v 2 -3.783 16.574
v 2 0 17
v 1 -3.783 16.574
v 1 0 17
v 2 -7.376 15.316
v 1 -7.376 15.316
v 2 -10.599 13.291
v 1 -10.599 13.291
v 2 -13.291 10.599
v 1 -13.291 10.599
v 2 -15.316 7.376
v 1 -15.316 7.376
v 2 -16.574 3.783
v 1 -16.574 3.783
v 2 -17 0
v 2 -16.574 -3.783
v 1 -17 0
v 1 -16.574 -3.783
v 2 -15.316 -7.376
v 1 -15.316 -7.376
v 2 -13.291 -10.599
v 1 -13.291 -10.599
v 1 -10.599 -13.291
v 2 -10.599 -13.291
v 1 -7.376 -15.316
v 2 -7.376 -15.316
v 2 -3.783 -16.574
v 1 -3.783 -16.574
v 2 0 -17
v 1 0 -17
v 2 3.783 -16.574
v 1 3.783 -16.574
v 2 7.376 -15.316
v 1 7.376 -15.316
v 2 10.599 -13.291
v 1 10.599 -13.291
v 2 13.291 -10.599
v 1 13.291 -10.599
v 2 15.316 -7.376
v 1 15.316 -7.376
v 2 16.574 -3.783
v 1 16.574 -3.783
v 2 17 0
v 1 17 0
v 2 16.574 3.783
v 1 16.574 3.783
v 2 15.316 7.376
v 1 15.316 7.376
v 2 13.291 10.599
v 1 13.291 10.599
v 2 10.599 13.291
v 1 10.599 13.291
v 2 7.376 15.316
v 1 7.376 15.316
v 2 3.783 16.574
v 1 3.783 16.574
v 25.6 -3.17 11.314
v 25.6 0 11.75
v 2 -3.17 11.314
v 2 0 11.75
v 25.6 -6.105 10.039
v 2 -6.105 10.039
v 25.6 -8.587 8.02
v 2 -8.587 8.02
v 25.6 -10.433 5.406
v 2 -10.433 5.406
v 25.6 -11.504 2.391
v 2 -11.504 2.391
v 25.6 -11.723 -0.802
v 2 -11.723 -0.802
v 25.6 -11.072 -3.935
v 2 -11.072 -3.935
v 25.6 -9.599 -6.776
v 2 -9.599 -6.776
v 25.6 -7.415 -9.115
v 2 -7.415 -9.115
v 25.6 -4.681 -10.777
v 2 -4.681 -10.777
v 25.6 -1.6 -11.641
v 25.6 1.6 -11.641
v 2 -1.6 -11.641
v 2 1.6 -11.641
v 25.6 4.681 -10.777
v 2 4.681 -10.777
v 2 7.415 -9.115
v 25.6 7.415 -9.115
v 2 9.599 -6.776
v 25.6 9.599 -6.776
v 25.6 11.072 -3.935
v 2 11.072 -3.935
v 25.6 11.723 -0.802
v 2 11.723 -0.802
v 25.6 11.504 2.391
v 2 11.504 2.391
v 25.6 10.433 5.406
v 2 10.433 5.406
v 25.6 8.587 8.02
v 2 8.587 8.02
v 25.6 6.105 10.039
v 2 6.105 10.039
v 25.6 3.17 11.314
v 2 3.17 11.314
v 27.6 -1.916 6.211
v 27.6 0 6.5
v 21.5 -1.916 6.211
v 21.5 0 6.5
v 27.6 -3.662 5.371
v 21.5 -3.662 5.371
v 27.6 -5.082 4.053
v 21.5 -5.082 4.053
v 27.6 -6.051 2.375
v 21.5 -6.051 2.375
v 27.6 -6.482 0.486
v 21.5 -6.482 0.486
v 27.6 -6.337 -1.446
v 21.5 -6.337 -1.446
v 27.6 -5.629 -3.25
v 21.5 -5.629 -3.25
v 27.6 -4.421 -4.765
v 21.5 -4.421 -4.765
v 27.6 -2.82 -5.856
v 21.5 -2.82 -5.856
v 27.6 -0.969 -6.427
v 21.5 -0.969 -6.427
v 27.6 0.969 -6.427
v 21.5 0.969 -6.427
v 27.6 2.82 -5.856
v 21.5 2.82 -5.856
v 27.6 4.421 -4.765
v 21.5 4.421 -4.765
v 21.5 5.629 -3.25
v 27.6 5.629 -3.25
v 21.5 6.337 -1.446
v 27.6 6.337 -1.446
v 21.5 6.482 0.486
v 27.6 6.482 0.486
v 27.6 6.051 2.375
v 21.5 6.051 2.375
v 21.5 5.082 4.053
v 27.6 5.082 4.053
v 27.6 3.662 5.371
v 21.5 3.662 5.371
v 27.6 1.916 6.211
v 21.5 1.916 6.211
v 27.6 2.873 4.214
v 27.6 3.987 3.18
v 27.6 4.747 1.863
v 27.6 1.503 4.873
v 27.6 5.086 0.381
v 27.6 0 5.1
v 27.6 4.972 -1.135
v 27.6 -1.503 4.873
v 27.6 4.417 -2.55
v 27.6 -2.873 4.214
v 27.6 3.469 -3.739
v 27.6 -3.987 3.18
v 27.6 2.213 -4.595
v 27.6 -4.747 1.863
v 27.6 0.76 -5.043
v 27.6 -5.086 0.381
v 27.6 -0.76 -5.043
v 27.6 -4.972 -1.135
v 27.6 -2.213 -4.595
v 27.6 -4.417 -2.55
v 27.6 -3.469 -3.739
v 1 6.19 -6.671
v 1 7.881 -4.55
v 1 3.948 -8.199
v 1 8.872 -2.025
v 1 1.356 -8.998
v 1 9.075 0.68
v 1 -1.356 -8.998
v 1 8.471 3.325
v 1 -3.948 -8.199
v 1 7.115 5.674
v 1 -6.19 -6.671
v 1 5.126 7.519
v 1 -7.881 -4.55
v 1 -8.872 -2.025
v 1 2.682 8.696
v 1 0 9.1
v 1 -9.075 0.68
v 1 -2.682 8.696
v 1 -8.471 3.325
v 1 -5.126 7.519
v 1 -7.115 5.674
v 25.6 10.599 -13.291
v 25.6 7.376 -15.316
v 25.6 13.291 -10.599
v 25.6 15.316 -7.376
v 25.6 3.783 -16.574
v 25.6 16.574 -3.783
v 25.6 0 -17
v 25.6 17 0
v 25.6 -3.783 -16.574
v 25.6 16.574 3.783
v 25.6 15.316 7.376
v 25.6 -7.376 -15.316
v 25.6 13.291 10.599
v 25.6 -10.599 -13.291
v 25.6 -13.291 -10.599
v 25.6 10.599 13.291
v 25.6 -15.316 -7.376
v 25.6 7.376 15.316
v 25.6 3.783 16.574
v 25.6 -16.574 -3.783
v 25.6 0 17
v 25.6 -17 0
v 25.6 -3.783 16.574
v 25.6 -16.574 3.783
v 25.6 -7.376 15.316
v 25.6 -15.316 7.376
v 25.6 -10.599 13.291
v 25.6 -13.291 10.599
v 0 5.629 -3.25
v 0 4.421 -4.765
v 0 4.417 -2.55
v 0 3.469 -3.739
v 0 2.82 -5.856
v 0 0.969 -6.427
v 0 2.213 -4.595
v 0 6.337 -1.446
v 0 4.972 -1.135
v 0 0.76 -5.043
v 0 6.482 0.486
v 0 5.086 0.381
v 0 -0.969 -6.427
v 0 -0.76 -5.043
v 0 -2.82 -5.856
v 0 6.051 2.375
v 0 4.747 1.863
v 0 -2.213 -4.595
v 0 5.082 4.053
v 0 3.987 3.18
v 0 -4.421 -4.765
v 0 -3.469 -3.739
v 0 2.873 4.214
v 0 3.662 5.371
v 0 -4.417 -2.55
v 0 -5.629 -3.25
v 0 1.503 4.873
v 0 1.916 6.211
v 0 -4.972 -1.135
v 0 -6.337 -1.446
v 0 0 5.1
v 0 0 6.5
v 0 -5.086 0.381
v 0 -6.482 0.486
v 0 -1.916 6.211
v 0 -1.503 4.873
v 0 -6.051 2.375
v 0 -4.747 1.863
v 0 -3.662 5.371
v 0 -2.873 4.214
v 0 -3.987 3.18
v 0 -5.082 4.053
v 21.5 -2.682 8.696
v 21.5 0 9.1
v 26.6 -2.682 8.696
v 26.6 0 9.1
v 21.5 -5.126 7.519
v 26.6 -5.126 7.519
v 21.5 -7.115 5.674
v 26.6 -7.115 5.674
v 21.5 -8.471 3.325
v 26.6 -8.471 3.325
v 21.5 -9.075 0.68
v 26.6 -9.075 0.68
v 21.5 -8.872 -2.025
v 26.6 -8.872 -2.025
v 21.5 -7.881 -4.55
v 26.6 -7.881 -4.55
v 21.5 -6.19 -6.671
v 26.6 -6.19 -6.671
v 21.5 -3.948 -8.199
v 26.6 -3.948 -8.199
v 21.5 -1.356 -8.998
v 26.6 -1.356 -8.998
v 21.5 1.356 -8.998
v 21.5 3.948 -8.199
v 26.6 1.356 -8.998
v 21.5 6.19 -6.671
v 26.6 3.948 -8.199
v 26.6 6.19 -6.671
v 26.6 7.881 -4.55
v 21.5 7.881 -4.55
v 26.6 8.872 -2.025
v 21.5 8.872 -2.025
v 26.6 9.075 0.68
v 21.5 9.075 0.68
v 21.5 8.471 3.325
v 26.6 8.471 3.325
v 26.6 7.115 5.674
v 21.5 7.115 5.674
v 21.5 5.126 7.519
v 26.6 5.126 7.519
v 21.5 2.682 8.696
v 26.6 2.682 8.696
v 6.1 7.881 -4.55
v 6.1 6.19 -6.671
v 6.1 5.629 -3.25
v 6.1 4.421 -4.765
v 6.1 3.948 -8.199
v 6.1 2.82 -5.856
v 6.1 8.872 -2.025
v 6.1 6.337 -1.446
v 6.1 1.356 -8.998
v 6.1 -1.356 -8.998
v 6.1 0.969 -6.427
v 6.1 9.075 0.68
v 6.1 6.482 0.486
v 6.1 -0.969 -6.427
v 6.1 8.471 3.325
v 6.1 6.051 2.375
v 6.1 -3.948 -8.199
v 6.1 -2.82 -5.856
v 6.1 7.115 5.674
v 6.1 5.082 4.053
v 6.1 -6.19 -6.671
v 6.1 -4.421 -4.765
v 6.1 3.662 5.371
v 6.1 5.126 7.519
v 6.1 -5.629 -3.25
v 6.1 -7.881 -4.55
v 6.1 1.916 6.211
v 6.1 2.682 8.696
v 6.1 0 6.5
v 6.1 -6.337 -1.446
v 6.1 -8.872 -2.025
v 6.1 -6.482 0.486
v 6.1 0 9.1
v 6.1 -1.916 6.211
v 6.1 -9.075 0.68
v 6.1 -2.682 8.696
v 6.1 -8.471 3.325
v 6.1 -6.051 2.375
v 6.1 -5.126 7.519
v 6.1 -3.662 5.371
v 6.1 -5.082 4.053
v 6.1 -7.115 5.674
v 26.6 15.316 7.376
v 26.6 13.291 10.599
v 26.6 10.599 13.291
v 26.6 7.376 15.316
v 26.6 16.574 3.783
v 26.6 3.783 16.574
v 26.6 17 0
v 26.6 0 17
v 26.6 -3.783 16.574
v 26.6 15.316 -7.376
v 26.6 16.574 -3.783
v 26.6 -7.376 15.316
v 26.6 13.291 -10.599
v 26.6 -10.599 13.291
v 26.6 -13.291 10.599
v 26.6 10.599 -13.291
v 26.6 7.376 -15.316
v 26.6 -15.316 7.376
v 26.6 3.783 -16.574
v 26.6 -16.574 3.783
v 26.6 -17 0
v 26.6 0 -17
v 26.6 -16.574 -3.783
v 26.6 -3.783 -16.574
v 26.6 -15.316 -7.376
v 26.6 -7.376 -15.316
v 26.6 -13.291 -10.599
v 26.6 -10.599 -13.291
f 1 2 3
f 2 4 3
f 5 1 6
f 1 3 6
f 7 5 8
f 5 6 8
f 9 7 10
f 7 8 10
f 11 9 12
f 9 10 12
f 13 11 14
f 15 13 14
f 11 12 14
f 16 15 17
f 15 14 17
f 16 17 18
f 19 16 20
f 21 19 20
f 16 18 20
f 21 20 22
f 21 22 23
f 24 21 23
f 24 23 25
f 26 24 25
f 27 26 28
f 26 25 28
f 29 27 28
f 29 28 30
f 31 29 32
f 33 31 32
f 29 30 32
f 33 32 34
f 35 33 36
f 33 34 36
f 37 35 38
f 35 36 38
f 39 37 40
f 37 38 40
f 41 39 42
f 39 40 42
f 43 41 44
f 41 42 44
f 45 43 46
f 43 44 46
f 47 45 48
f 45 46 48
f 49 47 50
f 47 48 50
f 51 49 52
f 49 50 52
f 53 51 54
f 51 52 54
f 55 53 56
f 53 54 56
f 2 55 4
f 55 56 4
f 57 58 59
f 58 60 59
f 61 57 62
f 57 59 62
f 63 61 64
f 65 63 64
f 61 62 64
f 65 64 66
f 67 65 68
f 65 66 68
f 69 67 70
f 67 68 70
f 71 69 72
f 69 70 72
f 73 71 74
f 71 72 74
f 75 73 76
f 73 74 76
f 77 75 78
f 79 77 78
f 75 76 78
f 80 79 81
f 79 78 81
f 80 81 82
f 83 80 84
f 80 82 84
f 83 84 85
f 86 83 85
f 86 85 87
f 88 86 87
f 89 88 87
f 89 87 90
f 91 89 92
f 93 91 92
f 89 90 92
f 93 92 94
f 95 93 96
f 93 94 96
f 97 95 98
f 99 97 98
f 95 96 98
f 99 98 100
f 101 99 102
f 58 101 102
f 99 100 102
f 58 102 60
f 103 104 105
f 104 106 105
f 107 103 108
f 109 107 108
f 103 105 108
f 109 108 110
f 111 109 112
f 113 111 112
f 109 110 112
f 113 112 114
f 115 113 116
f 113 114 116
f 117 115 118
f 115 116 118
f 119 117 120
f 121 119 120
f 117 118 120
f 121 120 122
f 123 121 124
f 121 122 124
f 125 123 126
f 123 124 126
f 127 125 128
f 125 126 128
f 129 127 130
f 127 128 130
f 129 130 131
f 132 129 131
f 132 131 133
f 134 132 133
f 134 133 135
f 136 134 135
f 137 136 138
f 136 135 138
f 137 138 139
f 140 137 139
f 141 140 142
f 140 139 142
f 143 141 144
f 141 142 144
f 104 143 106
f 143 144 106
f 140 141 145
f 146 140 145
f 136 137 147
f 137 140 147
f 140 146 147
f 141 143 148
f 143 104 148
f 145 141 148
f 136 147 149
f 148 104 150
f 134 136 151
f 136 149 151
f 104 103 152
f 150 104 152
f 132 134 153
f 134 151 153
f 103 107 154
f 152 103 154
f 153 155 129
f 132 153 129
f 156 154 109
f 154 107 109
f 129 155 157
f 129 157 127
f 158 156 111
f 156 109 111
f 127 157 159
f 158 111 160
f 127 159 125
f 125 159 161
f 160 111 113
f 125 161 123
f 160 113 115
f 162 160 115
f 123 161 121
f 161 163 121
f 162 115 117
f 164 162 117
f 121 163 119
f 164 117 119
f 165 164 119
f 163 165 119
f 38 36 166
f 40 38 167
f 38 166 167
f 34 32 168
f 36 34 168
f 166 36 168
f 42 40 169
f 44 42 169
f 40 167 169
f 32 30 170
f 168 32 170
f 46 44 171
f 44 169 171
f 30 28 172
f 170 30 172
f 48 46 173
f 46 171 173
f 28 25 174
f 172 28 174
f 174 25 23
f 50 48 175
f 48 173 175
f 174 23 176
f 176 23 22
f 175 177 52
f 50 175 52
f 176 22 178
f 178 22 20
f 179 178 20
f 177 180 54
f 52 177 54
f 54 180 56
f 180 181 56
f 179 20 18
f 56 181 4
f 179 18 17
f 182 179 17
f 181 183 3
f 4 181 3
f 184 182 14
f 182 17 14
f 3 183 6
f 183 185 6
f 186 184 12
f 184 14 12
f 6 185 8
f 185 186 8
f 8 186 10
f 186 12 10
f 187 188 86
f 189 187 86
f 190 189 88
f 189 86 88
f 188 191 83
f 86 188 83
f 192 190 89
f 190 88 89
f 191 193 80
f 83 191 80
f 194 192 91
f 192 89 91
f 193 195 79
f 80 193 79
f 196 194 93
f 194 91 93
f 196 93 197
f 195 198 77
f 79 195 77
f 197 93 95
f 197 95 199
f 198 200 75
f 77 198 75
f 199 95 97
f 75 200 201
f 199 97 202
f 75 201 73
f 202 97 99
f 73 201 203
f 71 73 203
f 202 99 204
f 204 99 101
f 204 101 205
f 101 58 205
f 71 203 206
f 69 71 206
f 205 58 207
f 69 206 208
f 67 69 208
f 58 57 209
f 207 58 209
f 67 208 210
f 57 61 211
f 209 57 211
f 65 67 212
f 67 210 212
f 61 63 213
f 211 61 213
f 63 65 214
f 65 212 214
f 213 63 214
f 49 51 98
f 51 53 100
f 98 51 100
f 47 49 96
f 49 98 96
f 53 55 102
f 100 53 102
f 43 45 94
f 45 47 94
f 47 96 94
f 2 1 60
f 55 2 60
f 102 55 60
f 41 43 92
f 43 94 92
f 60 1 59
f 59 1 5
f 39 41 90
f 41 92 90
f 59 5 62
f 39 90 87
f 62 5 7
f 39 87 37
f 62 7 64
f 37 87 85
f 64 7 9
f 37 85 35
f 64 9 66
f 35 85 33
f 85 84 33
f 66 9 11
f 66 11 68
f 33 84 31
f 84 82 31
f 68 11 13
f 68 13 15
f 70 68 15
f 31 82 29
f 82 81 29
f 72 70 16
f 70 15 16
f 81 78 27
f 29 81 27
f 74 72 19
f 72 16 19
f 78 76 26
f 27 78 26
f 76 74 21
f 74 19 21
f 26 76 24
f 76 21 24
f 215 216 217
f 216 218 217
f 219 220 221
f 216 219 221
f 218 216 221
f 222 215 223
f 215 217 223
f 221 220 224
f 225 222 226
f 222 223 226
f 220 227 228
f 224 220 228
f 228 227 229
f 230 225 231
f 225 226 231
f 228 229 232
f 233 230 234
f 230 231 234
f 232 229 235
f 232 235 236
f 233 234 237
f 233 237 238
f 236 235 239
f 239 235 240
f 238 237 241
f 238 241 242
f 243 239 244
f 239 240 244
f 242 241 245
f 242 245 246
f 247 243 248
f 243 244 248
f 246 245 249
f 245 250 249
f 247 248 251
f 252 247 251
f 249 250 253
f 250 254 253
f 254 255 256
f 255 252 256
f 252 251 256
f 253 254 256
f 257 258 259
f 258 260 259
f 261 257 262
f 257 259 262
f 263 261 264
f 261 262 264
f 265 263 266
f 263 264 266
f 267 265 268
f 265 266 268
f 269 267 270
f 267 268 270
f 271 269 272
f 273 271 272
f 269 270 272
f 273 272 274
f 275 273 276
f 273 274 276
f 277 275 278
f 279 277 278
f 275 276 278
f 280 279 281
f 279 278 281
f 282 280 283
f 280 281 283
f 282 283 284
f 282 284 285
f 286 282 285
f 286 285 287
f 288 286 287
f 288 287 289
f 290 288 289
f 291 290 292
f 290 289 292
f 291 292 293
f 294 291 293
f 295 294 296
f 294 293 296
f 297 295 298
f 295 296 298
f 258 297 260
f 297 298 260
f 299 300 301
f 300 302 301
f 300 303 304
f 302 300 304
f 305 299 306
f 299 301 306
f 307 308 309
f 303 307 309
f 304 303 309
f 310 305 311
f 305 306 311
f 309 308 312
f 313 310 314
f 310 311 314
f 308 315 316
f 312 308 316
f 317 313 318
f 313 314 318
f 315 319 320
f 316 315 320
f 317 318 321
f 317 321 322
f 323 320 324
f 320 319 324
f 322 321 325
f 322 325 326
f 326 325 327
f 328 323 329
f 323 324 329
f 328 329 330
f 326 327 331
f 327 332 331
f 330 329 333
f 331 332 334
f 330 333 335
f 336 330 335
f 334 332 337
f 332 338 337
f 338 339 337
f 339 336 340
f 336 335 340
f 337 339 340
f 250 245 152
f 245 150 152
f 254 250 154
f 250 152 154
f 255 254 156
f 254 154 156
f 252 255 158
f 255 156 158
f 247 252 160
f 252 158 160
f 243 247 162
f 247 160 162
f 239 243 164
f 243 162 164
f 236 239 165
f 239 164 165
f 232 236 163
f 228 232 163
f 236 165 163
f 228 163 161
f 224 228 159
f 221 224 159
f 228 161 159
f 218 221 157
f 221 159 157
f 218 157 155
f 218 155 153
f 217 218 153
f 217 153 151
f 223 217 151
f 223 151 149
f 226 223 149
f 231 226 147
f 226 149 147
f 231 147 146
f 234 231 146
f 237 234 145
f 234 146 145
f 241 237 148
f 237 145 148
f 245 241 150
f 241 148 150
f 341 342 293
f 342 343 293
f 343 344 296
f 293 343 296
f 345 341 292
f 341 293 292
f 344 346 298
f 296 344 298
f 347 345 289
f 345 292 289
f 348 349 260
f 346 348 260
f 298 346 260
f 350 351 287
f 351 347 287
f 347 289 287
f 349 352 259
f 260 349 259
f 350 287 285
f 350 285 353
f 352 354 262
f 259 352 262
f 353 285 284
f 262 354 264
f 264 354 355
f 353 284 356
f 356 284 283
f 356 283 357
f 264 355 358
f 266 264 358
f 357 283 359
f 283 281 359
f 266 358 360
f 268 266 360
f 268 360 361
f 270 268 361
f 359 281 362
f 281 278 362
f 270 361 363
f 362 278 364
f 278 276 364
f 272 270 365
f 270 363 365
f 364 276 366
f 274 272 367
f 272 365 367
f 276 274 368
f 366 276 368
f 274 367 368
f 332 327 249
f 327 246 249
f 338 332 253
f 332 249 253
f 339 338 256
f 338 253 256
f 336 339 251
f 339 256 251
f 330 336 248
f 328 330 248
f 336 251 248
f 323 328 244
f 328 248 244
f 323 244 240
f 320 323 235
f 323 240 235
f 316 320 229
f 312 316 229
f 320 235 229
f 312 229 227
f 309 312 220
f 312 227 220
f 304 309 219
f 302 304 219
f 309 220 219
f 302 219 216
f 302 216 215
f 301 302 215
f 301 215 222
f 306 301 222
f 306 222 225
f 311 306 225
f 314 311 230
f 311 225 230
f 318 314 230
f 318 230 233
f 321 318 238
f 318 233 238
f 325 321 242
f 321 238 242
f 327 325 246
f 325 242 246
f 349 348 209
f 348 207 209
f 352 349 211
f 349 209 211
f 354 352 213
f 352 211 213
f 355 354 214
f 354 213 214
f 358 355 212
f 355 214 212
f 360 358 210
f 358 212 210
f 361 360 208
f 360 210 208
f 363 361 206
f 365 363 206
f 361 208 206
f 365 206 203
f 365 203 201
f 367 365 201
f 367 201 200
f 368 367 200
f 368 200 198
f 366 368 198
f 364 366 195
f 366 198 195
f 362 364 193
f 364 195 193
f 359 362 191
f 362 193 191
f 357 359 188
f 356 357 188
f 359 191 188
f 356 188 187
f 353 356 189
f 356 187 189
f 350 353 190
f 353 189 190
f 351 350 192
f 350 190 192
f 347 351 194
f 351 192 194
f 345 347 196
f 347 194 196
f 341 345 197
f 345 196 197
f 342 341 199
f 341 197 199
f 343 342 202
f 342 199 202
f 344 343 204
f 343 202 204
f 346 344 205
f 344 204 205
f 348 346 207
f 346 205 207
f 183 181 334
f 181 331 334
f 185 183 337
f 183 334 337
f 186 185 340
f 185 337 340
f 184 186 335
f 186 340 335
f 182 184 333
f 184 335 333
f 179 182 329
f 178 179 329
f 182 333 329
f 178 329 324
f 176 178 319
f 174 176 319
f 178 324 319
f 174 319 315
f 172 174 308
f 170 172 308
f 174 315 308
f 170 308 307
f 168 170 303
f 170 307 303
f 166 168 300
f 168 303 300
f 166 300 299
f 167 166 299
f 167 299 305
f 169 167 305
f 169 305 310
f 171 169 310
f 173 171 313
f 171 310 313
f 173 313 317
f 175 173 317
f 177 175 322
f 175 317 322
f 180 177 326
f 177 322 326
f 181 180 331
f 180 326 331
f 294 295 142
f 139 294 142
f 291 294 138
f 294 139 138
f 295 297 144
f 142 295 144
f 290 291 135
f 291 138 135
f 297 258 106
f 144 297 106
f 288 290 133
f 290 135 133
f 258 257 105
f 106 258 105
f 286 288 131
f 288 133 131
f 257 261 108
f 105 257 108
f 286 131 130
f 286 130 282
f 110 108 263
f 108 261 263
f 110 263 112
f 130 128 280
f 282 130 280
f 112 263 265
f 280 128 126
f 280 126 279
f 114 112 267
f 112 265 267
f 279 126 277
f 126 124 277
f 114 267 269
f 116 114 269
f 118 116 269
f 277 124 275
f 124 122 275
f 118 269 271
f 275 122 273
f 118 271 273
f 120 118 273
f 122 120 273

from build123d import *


with BuildPart() as part:
    # Sketch1 → Revolve1 (revolve)
    with BuildSketch(Plane.XY, mode=Mode.PRIVATE) as revolve1_sk:
        Polygon((0, 6.5), (0, 5.1), (27.6, 5.1), (27.6, 6.5), (21.5, 6.5), (21.5, 9.1), (26.6, 9.1), (26.6, 17), (25.6, 17), (25.6, 11.75), (2, 11.75), (2, 17), (1, 17), (1, 9.1), (6.1, 9.1), (6.1, 6.5), align=None)
    revolve(revolve1_sk.sketch.rotate(Axis((0, 0, 0), (1, 0, 0)), 90), axis=Axis((0, 0, 0), (1, 0, 0)))


solid = part.part
